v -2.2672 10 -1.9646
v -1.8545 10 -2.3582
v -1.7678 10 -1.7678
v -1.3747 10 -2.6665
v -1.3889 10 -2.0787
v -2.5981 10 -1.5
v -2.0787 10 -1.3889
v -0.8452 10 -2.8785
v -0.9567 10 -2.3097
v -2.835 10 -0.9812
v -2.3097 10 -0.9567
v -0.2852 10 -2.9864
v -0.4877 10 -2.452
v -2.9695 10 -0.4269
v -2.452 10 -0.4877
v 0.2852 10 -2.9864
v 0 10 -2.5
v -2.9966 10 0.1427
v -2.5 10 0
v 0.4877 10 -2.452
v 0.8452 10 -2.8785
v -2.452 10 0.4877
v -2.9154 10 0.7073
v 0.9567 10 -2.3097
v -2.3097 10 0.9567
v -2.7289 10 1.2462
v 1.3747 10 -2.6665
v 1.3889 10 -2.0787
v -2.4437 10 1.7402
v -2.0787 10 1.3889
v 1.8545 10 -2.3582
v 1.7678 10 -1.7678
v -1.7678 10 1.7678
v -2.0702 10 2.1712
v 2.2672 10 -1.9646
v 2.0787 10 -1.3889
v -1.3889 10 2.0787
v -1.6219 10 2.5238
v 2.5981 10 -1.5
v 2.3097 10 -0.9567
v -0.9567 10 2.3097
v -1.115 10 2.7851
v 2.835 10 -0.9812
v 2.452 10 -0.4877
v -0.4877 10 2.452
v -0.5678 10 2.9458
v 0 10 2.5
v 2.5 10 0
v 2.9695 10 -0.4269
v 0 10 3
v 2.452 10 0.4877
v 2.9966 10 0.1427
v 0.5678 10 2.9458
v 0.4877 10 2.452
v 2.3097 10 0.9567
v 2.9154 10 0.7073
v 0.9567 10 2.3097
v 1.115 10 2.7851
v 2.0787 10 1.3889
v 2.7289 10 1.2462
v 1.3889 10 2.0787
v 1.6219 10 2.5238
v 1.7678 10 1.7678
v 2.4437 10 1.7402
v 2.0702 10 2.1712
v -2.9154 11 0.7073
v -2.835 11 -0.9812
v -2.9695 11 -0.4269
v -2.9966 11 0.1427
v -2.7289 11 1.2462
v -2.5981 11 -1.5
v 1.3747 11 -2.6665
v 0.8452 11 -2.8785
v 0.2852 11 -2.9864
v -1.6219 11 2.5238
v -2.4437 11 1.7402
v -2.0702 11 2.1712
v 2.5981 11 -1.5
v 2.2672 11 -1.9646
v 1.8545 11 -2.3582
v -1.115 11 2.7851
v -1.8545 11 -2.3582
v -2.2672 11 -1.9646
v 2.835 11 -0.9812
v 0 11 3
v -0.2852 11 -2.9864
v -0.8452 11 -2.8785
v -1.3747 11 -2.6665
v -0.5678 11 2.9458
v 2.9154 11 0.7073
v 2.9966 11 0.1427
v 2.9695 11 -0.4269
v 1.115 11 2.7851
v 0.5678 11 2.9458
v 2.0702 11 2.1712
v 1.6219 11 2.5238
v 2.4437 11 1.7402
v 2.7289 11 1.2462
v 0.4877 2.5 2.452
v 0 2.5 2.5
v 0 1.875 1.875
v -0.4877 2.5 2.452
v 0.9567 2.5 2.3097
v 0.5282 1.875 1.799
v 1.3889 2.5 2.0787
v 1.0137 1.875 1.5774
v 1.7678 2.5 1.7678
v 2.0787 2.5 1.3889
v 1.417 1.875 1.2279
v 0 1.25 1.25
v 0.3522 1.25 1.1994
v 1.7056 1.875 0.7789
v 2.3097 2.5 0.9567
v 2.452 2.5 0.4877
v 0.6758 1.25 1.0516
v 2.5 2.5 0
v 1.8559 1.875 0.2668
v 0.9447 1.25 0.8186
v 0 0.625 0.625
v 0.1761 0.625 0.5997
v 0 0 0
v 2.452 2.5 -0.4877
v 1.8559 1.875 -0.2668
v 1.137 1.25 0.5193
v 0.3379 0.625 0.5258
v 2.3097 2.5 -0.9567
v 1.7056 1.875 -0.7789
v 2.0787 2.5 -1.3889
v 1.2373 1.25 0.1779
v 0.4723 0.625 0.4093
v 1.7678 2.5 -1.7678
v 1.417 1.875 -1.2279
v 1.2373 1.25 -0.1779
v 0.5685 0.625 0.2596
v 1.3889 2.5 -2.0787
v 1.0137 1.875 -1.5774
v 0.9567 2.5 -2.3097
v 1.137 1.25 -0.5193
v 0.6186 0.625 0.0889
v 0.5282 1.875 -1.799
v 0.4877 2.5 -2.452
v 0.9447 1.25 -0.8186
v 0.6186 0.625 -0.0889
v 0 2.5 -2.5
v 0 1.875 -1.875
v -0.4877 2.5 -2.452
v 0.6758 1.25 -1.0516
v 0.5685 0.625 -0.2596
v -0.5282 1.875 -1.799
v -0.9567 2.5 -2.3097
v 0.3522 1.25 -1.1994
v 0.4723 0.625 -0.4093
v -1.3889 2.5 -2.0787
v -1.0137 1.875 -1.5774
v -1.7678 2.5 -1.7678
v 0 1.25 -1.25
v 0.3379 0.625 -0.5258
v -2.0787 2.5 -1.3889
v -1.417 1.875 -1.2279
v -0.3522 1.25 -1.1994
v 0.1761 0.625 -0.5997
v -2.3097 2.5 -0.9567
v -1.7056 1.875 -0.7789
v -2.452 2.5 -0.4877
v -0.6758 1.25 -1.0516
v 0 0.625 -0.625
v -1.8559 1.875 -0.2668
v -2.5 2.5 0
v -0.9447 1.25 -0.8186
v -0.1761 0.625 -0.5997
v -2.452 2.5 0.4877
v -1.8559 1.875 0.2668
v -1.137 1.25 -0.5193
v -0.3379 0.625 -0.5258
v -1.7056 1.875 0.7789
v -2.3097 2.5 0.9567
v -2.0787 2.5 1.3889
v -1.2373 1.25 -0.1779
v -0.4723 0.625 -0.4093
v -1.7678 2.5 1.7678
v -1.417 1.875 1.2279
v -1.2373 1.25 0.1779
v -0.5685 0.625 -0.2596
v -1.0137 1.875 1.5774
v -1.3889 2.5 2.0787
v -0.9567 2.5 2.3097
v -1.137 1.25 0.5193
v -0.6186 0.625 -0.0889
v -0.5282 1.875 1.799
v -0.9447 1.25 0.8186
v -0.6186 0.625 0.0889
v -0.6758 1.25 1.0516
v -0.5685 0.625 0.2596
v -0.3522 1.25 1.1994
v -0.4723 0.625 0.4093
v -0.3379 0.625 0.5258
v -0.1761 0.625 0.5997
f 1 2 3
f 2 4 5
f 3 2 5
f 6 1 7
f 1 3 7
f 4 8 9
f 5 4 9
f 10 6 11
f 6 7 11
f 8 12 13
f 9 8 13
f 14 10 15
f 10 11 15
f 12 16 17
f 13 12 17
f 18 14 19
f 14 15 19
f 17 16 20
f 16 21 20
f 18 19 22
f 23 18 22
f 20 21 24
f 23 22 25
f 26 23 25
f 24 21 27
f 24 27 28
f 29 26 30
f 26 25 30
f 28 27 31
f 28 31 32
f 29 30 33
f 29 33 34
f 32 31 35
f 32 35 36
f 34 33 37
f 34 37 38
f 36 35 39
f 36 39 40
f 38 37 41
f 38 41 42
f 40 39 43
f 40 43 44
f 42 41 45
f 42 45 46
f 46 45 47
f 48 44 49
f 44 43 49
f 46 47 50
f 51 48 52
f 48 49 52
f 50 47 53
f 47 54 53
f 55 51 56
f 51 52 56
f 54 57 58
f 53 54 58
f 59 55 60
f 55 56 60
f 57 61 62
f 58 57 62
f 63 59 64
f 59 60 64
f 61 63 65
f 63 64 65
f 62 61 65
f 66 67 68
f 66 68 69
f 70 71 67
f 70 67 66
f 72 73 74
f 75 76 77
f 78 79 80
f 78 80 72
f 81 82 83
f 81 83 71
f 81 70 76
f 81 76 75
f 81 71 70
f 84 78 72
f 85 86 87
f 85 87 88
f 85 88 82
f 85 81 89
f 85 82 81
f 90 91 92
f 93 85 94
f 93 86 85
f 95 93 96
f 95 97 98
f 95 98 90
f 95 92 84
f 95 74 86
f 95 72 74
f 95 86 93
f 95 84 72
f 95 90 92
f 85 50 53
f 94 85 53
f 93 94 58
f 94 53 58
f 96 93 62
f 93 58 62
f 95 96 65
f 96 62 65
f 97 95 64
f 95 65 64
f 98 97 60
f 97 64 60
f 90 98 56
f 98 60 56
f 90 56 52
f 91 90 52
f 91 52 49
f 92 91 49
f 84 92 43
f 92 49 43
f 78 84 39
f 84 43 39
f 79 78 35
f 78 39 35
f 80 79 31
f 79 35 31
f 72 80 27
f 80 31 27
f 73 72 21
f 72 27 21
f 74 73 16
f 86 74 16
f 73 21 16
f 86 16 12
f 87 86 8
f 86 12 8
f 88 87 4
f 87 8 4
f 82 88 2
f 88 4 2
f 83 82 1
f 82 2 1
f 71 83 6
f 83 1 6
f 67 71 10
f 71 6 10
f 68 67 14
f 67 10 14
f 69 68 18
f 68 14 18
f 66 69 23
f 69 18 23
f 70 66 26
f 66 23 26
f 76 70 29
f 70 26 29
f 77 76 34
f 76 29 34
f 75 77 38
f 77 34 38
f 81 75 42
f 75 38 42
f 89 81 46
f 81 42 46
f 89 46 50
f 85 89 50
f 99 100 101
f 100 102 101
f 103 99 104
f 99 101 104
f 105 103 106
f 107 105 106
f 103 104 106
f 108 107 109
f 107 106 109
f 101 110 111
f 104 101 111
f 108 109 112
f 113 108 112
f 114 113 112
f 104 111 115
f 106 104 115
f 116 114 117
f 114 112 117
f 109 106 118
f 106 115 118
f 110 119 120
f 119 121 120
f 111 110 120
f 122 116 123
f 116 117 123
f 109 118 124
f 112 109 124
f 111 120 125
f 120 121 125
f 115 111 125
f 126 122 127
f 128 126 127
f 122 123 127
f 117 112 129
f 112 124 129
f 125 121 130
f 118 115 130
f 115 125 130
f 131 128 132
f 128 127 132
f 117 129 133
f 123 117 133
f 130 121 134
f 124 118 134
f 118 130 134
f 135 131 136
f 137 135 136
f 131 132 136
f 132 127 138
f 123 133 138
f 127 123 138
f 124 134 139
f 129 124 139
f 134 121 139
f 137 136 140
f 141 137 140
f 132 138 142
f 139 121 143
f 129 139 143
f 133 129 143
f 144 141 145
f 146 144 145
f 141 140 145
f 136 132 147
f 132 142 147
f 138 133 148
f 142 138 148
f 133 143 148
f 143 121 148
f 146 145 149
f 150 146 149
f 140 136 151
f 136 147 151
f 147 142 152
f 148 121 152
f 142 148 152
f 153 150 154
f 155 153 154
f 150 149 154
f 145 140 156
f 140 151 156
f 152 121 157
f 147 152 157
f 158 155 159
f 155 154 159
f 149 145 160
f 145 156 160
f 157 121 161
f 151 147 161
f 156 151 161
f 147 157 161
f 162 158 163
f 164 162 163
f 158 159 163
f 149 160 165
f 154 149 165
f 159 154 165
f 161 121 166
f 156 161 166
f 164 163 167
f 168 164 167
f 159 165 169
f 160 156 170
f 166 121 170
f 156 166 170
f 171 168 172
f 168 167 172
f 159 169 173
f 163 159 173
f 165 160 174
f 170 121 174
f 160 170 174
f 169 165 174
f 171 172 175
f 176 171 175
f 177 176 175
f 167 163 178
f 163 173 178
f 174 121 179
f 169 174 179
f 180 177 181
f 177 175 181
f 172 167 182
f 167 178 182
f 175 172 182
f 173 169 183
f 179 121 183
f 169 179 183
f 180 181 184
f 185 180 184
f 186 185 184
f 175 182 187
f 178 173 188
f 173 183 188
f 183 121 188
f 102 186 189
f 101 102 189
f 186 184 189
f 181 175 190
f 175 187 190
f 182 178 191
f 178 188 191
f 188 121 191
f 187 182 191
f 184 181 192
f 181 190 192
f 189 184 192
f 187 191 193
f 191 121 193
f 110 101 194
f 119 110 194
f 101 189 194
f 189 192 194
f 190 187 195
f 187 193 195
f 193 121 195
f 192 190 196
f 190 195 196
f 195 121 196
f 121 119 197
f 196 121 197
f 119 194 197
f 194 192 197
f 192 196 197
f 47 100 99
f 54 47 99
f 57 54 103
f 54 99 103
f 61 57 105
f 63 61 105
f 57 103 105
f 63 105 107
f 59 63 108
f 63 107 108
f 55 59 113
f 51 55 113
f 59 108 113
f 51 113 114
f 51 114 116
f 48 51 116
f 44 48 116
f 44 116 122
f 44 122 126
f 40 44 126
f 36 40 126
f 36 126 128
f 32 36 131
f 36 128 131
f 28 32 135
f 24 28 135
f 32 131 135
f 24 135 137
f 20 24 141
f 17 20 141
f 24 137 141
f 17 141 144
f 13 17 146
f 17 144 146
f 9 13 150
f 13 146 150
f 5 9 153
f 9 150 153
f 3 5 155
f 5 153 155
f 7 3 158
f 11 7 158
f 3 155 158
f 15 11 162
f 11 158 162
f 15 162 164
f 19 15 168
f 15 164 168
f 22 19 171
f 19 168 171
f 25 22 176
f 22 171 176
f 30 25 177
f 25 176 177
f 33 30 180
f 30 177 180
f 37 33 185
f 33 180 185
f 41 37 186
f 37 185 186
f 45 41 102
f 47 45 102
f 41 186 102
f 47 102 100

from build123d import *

# Parameters (mm, degrees)
SZKIC1_R                    = 2.5
DODANIE_WYCI_GNI_CIE1_DEPTH = 10
SFAZOWANIE1_SIZE            = 2.5
SZKIC3_R                    = 3
DODANIE_WYCI_GNI_CIE2_DEPTH = 1


with BuildPart() as part:
    # Szkic1 → Dodanie-wyciągnięcie1 (new body)
    with BuildSketch(Plane(origin=(0, 0, 0), x_dir=(1, 0, 0), z_dir=(0, 1, 0))):
        with Locations(Location((0, 0, 0), (0, 0, 270))):
            Circle(SZKIC1_R)
    extrude(amount=DODANIE_WYCI_GNI_CIE1_DEPTH)

    # Sfazowanie1
    sfazowanie1_edges = [part.edges().sort_by_distance(p)[0] for p in [
        (0, 0, -2.5),
    ]]
    chamfer(sfazowanie1_edges, length=SFAZOWANIE1_SIZE)

    # Szkic3 → Dodanie-wyciągnięcie2 (add)
    with BuildSketch(Plane(origin=(0, 10, 0), x_dir=(1, 0, 0), z_dir=(0, 1, 0))):
        with Locations(Location((0, 0, 0), (0, 0, 270))):
            Circle(SZKIC3_R)
    extrude(amount=DODANIE_WYCI_GNI_CIE2_DEPTH)


solid = part.part
